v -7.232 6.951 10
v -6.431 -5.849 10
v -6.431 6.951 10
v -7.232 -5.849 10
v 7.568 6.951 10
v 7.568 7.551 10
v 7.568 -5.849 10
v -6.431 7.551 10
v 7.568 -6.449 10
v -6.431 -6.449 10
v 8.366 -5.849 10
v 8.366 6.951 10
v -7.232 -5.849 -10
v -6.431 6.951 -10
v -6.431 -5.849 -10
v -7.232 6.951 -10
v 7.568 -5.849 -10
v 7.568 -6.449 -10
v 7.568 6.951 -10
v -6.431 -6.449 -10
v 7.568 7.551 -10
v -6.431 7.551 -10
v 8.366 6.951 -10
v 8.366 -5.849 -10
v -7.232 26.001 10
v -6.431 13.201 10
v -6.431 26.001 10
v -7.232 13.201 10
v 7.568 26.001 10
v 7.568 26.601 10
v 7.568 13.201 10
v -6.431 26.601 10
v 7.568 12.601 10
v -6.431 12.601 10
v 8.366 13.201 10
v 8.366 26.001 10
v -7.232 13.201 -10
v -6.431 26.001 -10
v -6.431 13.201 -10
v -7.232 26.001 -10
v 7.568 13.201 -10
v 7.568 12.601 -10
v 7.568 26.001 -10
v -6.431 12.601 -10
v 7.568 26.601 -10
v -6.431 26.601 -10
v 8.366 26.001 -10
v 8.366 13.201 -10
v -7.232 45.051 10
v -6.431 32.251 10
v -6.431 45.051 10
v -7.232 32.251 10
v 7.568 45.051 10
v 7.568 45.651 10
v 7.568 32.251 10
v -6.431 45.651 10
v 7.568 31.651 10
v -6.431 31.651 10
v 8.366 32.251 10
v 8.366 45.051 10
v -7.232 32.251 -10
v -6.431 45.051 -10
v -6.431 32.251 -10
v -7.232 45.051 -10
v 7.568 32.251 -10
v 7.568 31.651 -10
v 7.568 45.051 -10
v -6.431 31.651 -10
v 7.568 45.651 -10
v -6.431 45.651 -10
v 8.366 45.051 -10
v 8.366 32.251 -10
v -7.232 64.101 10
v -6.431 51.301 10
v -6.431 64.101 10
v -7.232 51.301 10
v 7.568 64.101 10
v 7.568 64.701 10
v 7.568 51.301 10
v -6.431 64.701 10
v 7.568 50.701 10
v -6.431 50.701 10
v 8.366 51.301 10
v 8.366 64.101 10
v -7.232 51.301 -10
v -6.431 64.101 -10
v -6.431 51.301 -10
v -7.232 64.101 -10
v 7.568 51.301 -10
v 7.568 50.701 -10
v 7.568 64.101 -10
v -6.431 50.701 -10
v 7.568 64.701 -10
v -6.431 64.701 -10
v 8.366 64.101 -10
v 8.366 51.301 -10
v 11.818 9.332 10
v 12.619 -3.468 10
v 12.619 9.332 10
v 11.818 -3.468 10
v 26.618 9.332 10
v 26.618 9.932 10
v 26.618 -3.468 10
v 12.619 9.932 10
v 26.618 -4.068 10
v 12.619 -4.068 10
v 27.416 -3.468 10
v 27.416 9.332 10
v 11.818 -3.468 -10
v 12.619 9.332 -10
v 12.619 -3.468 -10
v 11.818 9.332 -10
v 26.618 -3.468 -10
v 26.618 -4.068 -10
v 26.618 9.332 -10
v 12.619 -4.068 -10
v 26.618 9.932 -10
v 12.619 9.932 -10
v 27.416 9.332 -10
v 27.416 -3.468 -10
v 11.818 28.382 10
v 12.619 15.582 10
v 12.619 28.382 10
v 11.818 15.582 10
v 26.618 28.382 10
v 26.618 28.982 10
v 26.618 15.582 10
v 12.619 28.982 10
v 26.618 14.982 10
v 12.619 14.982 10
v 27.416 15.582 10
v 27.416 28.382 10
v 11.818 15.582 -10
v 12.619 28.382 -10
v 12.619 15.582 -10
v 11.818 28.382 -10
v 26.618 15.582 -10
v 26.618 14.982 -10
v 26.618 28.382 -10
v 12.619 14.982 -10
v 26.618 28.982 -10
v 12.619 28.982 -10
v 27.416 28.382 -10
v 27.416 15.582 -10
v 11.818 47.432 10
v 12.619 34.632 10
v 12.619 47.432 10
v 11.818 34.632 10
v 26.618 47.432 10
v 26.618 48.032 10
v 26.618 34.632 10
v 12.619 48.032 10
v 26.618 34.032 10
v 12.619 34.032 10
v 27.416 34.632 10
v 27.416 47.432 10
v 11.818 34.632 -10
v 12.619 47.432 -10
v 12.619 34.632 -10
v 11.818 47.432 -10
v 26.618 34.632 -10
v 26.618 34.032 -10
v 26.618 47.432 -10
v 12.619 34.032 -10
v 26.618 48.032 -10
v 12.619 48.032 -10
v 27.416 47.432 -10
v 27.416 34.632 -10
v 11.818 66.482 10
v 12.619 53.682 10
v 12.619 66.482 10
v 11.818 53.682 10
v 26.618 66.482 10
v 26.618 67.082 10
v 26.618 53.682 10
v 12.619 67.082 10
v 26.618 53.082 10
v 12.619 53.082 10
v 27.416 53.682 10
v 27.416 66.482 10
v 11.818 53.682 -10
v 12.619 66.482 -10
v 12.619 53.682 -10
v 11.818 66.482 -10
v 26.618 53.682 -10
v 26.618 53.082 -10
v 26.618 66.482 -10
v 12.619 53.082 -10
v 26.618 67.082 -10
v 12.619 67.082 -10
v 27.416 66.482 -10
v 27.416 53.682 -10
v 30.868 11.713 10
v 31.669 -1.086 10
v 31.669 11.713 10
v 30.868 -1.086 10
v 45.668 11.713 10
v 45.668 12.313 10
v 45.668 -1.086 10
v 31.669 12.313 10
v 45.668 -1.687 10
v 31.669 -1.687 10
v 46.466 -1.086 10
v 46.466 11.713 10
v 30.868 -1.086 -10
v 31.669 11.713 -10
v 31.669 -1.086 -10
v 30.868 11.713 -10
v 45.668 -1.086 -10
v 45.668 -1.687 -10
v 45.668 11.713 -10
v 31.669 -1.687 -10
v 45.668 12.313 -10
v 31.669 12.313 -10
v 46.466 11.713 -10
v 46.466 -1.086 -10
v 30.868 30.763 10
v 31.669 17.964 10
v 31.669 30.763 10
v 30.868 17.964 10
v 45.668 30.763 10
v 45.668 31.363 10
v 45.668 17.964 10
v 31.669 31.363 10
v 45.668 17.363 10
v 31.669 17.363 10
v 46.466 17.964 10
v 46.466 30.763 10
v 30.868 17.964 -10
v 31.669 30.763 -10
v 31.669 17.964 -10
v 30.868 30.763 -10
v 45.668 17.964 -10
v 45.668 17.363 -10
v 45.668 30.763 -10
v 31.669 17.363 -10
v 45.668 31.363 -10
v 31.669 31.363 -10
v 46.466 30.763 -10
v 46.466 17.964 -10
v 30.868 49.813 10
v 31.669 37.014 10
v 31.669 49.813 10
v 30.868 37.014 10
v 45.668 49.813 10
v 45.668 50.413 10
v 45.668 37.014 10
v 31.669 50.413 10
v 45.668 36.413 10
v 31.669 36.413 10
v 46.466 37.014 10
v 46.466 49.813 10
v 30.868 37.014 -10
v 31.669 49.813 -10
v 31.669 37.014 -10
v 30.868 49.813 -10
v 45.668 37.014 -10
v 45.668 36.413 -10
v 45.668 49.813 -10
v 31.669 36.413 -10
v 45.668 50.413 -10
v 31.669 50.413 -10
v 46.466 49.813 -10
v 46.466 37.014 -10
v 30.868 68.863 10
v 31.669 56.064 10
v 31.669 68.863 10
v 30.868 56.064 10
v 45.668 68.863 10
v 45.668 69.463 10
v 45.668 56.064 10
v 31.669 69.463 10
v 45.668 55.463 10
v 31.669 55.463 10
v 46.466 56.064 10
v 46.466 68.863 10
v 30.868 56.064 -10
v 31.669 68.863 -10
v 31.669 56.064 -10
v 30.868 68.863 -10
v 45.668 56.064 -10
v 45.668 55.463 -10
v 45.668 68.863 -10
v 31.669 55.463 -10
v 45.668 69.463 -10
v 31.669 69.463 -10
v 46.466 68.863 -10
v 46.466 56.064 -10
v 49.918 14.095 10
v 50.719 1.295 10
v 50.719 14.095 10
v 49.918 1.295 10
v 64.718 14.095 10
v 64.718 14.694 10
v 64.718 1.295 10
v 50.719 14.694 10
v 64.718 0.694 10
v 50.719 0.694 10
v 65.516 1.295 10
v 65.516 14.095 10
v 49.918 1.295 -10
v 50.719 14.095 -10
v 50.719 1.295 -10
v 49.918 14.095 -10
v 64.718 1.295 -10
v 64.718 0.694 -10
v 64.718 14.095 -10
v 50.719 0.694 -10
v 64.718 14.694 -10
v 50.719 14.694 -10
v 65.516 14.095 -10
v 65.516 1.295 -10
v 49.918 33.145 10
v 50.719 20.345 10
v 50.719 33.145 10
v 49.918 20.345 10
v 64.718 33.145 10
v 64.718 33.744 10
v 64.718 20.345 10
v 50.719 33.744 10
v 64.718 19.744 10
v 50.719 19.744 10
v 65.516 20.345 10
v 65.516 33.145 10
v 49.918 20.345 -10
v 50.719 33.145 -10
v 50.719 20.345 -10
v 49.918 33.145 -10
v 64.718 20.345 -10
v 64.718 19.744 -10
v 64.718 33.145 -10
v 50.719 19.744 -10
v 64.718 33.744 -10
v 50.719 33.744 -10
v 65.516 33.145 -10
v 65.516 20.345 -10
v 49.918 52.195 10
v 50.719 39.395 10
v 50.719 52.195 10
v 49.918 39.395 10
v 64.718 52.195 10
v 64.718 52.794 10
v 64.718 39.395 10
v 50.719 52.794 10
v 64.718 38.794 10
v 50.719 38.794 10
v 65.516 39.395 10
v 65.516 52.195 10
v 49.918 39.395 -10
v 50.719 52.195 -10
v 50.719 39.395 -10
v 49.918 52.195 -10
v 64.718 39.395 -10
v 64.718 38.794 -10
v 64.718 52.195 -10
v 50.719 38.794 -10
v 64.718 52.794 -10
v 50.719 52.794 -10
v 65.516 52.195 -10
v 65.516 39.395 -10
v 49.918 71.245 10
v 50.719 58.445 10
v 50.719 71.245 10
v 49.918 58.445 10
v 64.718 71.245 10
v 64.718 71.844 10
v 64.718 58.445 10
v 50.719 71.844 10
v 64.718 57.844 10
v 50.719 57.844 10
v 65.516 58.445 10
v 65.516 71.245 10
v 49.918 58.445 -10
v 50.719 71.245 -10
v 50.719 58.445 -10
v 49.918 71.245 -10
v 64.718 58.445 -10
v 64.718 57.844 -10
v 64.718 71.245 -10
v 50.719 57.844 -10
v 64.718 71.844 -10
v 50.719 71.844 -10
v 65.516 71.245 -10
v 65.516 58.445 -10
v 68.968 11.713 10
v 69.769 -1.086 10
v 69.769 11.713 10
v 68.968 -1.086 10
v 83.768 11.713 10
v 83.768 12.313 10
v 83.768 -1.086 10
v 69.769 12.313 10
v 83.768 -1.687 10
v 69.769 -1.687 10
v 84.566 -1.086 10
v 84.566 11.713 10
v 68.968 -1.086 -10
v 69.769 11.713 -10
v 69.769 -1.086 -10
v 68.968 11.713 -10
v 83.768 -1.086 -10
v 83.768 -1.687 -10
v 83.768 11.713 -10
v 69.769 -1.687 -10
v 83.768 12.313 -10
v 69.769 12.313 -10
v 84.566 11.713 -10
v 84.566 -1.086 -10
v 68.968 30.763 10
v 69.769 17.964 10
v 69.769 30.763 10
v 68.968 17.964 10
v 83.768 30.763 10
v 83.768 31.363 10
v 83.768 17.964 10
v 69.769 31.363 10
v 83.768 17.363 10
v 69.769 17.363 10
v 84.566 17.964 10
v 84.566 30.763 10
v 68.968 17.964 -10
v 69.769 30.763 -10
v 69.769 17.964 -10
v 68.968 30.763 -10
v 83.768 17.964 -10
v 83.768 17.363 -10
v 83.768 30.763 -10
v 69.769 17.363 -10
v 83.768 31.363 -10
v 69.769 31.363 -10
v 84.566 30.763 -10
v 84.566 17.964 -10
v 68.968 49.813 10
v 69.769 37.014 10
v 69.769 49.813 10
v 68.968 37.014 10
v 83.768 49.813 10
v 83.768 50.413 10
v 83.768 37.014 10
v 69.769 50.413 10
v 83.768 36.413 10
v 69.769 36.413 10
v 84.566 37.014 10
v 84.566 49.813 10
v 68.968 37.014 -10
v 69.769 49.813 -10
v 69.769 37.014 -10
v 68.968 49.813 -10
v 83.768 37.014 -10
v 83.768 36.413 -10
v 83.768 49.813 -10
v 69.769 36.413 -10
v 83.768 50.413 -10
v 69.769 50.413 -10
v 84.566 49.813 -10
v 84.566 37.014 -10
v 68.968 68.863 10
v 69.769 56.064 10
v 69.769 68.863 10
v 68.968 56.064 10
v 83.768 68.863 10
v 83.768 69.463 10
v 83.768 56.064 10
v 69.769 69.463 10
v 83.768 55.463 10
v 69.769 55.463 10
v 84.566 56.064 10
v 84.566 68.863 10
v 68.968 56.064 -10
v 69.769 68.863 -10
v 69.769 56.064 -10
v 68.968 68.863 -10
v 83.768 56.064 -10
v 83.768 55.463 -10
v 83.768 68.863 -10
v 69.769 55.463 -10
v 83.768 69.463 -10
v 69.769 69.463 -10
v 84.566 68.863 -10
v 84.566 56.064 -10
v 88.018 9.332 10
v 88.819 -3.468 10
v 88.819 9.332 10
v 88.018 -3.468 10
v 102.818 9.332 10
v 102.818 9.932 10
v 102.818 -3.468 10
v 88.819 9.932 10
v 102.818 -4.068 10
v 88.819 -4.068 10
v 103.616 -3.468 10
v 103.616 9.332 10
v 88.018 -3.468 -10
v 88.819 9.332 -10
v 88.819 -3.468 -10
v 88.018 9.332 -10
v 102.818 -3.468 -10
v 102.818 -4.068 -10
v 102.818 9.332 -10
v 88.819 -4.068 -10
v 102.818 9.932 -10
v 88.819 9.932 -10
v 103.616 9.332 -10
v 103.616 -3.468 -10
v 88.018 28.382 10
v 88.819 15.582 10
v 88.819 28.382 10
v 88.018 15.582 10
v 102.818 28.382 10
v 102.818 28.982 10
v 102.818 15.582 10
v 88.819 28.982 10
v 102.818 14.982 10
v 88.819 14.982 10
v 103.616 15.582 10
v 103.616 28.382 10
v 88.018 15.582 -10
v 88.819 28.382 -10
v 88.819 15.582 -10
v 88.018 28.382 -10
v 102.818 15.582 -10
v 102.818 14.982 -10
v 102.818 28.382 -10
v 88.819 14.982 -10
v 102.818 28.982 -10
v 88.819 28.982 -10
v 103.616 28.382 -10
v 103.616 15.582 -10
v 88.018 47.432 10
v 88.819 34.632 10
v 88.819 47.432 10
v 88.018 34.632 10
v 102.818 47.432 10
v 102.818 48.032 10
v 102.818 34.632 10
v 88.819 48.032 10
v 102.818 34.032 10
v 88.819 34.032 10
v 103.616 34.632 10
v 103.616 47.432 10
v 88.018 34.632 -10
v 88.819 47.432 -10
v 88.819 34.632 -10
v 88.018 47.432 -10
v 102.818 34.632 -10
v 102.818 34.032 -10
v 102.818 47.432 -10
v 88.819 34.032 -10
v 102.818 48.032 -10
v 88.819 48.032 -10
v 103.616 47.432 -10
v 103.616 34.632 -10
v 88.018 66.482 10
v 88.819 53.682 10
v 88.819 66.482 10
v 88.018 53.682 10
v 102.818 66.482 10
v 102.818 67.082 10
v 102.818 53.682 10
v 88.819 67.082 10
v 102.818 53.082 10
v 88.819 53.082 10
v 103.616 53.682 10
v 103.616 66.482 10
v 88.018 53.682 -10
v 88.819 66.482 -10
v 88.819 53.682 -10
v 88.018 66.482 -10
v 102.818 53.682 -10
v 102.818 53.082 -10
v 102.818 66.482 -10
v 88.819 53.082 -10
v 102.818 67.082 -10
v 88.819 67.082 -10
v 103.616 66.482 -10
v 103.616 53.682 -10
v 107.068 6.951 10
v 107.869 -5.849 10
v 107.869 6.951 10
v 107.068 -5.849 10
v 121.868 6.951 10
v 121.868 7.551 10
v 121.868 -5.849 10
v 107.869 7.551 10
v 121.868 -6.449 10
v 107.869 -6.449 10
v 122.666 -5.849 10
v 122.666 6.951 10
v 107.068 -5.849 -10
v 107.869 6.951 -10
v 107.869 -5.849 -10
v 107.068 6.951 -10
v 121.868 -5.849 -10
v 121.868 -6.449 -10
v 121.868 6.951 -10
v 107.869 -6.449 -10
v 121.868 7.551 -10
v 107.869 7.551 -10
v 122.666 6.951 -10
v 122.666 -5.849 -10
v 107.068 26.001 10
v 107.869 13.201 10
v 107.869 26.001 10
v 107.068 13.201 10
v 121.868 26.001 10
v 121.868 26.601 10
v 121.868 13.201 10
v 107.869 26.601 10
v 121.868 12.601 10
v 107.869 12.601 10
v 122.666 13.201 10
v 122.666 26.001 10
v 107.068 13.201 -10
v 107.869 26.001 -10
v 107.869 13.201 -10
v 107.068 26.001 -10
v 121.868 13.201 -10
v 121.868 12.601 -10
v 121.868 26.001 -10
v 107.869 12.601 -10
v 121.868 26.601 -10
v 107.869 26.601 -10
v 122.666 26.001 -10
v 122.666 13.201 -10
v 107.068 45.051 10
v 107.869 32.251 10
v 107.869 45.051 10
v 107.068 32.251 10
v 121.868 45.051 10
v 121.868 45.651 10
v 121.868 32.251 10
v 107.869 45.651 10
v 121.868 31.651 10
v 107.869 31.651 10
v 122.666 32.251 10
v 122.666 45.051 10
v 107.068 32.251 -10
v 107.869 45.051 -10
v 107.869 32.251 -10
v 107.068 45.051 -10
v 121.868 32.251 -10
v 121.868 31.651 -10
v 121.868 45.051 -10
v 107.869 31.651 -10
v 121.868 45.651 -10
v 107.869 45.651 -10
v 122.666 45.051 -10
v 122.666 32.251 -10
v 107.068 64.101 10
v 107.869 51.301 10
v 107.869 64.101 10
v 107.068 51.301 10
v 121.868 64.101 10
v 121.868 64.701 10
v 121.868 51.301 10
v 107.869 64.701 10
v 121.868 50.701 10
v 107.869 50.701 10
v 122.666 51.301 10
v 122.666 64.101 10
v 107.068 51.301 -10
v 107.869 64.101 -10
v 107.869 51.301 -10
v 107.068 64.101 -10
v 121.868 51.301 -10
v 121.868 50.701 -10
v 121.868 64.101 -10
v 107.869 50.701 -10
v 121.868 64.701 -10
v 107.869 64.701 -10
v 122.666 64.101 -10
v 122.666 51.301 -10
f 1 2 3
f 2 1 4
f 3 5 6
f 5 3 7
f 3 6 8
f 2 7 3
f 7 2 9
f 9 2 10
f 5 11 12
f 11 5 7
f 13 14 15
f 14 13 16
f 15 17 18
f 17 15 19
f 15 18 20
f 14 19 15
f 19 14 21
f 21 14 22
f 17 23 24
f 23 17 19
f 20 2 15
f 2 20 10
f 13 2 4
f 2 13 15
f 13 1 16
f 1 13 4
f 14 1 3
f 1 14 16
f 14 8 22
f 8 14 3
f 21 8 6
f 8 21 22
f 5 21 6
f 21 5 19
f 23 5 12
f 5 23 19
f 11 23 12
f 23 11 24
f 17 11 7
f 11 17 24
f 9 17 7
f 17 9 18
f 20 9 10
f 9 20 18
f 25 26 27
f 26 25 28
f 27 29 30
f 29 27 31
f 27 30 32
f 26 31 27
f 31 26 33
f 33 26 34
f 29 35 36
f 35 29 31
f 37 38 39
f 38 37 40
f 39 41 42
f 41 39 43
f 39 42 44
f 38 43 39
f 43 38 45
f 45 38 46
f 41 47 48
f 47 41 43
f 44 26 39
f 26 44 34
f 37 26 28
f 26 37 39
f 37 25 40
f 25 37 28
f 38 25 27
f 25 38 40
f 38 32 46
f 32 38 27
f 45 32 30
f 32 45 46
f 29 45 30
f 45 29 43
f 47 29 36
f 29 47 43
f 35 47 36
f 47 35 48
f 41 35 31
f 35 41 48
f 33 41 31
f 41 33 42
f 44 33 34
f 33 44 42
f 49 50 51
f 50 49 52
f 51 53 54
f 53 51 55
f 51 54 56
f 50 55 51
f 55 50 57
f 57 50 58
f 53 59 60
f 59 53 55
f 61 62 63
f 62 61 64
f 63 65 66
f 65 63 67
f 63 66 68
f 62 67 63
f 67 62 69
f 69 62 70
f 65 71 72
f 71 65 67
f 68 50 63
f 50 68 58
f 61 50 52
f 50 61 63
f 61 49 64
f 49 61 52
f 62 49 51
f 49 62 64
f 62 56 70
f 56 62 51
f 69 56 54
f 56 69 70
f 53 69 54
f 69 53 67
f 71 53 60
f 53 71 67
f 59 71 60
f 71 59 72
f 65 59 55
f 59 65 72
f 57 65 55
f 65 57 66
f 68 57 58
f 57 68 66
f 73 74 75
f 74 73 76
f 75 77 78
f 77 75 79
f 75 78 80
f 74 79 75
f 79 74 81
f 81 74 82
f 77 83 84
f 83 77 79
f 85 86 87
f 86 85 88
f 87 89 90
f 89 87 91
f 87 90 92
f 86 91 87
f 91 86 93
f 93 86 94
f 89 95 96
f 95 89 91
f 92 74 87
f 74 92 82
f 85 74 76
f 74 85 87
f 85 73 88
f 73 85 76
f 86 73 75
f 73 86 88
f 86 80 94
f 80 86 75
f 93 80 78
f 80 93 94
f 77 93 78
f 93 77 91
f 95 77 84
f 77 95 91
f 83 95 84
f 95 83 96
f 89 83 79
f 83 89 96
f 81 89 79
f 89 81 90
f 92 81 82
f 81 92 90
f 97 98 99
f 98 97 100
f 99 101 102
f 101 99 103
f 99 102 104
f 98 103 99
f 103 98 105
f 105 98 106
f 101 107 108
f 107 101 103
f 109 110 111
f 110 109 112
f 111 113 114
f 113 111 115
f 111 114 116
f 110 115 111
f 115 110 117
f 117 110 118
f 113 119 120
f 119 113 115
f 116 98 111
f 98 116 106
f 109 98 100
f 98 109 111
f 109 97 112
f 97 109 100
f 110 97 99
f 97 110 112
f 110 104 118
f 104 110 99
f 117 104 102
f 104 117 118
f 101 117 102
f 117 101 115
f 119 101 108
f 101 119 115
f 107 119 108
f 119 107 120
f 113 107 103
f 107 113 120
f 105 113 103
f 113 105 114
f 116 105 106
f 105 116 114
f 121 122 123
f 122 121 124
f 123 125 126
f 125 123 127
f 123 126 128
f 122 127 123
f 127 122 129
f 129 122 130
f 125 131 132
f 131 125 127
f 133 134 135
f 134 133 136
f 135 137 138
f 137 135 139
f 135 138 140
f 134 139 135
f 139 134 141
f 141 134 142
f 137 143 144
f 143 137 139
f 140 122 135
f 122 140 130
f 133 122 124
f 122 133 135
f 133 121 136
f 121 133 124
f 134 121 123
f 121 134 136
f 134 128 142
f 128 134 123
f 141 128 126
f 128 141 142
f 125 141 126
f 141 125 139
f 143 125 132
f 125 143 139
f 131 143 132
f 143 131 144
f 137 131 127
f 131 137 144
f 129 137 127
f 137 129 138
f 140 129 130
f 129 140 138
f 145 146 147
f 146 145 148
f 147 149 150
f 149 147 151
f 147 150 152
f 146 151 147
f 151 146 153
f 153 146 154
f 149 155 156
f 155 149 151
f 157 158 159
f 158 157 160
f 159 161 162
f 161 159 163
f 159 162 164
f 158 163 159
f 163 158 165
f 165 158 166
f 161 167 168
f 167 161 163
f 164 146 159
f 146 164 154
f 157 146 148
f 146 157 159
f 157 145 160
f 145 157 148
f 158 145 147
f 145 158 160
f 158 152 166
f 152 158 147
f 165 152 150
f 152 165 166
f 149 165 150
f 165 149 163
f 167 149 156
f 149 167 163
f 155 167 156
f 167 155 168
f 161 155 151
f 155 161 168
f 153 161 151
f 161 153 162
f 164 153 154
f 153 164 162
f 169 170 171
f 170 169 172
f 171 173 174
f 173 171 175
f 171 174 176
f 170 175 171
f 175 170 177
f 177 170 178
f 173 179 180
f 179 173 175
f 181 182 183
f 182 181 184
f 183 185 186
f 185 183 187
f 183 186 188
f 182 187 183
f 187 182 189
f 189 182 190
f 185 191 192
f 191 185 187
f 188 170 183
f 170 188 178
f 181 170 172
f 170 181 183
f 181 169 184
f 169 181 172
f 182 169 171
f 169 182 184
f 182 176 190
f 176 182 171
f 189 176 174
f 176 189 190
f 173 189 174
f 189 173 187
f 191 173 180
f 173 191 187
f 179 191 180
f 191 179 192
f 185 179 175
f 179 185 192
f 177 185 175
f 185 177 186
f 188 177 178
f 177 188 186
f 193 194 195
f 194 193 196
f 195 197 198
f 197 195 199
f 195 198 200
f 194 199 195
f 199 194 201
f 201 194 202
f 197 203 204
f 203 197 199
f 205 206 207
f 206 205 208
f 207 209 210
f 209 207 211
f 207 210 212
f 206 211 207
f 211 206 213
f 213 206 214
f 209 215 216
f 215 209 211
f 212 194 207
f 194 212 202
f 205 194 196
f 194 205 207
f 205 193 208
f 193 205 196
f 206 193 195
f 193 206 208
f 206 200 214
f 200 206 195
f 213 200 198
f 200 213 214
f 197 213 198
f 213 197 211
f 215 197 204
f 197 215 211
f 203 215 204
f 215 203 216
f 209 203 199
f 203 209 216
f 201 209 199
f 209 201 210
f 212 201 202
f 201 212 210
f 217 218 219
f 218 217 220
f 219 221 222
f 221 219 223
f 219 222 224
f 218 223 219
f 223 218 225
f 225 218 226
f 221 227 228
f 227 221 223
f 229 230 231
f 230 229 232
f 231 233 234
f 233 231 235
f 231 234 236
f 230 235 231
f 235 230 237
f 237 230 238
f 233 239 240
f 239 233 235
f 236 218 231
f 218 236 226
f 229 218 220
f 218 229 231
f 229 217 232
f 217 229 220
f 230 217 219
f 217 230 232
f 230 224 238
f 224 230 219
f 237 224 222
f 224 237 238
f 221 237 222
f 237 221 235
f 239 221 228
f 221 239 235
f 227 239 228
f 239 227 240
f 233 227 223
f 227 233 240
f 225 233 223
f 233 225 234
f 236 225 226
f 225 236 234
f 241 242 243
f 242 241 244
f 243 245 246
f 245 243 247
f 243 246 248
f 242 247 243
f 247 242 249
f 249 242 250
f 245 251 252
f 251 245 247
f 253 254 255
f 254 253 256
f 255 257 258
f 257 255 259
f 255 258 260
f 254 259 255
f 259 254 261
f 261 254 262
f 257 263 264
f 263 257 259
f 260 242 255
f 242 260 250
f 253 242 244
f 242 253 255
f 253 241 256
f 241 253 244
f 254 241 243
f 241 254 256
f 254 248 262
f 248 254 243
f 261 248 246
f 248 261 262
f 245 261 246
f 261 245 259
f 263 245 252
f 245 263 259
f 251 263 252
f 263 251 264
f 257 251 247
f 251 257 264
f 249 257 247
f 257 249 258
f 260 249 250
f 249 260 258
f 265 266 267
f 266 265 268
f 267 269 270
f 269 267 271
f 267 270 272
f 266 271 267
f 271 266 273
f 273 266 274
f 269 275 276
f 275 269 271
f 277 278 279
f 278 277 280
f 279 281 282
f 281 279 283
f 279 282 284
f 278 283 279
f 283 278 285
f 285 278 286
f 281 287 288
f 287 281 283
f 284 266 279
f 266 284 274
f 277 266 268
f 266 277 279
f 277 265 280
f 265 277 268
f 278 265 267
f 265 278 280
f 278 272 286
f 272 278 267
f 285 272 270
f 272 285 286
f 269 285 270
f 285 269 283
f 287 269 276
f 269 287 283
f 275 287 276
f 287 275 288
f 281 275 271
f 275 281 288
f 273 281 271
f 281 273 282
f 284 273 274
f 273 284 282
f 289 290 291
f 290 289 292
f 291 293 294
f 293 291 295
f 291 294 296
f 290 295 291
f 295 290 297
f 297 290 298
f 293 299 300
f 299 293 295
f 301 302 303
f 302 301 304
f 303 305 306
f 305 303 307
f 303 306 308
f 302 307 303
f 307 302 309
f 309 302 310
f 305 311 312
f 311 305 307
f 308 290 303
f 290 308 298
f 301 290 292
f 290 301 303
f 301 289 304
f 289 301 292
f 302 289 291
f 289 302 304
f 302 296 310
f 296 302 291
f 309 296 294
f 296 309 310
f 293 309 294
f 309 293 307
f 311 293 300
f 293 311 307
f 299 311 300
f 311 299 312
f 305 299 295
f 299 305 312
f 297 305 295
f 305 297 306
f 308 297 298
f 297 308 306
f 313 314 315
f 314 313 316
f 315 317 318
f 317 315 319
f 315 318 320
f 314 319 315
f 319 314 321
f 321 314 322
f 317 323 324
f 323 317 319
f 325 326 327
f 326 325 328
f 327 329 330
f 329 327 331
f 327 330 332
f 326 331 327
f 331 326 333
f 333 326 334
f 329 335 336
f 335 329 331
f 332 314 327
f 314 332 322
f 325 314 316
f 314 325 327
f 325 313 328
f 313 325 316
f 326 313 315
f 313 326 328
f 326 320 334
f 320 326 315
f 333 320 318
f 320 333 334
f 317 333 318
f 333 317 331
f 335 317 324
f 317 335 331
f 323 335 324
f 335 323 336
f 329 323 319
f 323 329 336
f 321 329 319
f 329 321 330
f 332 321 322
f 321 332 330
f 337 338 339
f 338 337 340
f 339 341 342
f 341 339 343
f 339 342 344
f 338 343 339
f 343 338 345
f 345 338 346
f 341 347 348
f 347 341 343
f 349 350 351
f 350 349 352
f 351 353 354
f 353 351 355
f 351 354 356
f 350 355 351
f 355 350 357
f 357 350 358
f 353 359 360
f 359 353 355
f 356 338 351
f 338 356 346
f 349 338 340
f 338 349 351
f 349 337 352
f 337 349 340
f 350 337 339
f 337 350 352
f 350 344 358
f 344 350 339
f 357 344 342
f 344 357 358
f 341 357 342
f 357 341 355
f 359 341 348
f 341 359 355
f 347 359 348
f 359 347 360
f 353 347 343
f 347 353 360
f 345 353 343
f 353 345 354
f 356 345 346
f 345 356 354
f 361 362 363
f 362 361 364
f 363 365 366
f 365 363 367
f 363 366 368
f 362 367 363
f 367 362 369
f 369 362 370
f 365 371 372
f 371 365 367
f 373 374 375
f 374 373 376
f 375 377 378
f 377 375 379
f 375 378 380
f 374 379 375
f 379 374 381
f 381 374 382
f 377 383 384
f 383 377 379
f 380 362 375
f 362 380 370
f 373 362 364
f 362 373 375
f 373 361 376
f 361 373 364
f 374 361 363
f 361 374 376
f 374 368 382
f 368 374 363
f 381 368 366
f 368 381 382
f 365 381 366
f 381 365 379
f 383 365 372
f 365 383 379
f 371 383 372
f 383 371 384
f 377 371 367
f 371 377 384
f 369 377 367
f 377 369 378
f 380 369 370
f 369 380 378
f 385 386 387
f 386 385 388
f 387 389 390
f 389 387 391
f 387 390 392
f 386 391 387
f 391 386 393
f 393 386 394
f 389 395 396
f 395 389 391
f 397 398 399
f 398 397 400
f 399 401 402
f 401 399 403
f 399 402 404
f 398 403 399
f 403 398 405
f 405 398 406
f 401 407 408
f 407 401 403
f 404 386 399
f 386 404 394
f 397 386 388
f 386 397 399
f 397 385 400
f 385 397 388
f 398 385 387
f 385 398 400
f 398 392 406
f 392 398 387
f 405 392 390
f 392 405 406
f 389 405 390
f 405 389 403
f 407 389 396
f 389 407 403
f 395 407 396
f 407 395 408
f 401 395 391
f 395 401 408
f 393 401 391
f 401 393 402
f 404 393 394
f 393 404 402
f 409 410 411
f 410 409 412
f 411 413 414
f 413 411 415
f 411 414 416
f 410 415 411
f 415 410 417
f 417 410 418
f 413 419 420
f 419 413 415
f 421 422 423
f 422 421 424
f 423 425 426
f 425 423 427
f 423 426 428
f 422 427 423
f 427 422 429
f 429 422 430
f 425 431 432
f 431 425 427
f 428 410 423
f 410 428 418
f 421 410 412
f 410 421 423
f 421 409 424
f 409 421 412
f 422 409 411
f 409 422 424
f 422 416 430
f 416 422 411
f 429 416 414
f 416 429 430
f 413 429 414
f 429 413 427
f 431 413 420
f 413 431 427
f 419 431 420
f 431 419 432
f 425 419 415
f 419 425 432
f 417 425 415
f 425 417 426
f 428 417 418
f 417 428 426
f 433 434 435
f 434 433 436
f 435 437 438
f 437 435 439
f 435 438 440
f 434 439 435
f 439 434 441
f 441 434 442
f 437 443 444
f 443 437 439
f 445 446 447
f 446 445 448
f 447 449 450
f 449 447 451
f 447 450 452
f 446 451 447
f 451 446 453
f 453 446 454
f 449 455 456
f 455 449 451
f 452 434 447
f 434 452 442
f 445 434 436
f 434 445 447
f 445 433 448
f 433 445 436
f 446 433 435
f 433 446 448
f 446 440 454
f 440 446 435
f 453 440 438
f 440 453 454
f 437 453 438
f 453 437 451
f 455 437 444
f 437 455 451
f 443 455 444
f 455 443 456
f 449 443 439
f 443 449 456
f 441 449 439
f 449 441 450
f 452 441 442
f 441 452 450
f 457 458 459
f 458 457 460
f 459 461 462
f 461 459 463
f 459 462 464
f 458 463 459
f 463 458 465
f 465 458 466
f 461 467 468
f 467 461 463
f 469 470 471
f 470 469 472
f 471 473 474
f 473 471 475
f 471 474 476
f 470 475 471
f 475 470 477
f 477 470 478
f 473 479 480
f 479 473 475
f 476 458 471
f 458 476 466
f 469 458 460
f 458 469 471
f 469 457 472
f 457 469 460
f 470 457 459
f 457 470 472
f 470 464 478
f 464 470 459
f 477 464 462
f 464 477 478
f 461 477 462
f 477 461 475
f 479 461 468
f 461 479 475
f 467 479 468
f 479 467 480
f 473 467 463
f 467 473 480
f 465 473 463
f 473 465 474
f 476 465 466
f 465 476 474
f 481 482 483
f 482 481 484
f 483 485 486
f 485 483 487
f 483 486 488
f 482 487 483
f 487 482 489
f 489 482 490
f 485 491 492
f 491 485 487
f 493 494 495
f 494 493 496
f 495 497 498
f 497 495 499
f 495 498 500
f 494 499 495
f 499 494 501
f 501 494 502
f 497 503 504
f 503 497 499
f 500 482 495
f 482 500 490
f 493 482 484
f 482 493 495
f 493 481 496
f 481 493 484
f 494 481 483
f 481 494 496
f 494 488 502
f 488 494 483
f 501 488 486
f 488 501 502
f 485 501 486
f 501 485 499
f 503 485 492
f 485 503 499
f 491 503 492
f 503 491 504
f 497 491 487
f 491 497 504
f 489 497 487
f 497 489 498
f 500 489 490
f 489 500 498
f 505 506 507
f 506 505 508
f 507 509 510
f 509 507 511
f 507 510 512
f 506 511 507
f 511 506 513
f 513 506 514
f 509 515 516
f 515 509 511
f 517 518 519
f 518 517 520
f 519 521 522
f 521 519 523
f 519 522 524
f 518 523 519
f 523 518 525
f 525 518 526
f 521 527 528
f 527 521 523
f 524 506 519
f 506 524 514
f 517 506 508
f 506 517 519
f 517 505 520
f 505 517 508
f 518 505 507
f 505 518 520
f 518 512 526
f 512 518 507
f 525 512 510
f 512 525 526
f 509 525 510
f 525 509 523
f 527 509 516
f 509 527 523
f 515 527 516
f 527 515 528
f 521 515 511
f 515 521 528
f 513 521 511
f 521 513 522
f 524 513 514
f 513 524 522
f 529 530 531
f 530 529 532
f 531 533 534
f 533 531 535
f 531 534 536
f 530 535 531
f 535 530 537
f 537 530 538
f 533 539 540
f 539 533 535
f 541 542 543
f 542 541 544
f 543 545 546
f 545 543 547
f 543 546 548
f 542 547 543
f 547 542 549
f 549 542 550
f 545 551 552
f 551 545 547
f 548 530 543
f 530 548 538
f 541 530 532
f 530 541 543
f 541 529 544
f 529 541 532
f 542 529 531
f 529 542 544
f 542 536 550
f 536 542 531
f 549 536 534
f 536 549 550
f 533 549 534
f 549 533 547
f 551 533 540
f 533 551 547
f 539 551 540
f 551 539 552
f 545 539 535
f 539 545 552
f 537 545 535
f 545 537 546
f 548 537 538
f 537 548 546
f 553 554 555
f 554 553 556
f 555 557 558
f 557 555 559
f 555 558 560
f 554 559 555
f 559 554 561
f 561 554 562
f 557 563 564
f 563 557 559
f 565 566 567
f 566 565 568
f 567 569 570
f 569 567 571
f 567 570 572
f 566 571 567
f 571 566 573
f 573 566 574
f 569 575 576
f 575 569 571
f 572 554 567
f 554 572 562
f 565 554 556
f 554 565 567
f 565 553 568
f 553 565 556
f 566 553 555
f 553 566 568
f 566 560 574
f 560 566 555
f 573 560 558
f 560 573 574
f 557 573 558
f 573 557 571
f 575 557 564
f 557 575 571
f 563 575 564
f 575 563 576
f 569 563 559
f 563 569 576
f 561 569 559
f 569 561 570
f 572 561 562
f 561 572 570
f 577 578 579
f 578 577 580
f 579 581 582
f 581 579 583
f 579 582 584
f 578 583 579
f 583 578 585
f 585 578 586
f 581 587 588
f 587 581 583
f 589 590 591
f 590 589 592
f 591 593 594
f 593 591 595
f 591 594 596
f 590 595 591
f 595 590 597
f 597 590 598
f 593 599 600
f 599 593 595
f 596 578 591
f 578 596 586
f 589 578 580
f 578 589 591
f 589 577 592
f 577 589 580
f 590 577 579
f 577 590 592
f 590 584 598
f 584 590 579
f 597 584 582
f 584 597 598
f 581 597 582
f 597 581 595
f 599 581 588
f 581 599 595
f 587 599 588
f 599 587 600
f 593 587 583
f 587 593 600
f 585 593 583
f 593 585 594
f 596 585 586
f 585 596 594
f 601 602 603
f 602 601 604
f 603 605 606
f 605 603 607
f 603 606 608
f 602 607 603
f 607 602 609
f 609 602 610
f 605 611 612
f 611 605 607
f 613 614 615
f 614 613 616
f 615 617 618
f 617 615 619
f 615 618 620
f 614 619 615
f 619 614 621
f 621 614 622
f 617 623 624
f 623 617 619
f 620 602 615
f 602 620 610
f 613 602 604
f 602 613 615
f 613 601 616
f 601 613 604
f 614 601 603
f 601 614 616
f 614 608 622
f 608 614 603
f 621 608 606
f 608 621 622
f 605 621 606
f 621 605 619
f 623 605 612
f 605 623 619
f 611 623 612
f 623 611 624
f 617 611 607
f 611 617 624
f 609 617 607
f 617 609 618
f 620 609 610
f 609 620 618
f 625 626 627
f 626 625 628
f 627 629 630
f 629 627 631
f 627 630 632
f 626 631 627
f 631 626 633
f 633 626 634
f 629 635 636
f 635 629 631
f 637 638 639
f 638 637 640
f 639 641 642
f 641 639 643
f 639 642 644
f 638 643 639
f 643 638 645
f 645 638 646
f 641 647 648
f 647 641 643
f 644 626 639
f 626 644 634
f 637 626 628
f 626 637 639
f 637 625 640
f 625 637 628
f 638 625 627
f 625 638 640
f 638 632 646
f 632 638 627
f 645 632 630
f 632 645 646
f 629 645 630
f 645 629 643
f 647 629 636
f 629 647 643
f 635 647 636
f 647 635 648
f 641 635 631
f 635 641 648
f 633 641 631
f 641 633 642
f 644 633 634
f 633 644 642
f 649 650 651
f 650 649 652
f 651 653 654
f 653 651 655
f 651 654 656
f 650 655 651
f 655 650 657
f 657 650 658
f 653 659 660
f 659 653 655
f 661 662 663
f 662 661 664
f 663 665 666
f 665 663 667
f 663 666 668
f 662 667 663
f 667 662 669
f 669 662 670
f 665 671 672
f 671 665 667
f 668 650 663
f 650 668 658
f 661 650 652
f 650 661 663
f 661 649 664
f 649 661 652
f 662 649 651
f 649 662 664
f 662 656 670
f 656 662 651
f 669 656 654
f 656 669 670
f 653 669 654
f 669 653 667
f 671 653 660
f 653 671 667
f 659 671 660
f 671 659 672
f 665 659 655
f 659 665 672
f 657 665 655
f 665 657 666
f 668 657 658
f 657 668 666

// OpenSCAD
spacingdfx=25.4*3/4;

spacing=25.4*3/4;

frontbackangle = 10;
leftrightangle = 10;
mxalps = 1;  // 0:MX 1:MXAlps

module punchMX()
{
 difference(){
  cube([20,20,20],center = true);
        
        translate([-spacingdfx,-spacingdfx,0])
        linear_extrude(height = 50, center = true, convexity = 10)
        import (file = "MX2.dxf");



 }
}

module punchMXAlps()
{
 difference(){
  cube([20,20,20],center = true);
        
        translate([-spacingdfx,-spacingdfx,0])
        linear_extrude(height = 50, center = true, convexity = 10)
        import (file = "MXAlps2.dxf");



 }
}   

translate([0*spacing,0*spacing,0])
        union()
        {

        translate ([0*spacing,0*spacing,0]) if (mxalps==1) punchMXAlps(); else punchMX(); 
        translate ([0*spacing,1*spacing,0]) if (mxalps==1) punchMXAlps(); else punchMX(); 
    translate ([0*spacing,2*spacing,0]) if (mxalps==1) punchMXAlps(); else punchMX(); 
        translate ([0*spacing,3*spacing,0]) if (mxalps==1) punchMXAlps(); else punchMX(); 
}

translate([1*spacing,0.125*spacing,0])
        union()
        {
translate ([0*spacing,0*spacing,0]) if (mxalps==1) punchMXAlps(); else punchMX(); 
translate ([0*spacing,1*spacing,0]) if (mxalps==1) punchMXAlps(); else punchMX(); 
    translate ([0*spacing,2*spacing,0]) if (mxalps==1) punchMXAlps(); else punchMX(); 
        translate ([0*spacing,3*spacing,0]) if (mxalps==1) punchMXAlps(); else punchMX(); }
        
translate([2*spacing,0.25*spacing,0])
        union()
        {
translate ([0*spacing,0*spacing,0]) if (mxalps==1) punchMXAlps(); else punchMX(); 
translate ([0*spacing,1*spacing,0]) if (mxalps==1) punchMXAlps(); else punchMX(); 
    translate ([0*spacing,2*spacing,0]) if (mxalps==1) punchMXAlps(); else punchMX(); 
        translate ([0*spacing,3*spacing,0]) if (mxalps==1) punchMXAlps(); else punchMX(); }        

translate([3*spacing,0.375*spacing,0])
        union()
        {
translate ([0*spacing,0*spacing,0]) if (mxalps==1) punchMXAlps(); else punchMX(); 
translate ([0*spacing,1*spacing,0]) if (mxalps==1) punchMXAlps(); else punchMX(); 
    translate ([0*spacing,2*spacing,0]) if (mxalps==1) punchMXAlps(); else punchMX(); 
        translate ([0*spacing,3*spacing,0]) if (mxalps==1) punchMXAlps(); else punchMX(); }
        
translate([4*spacing,0.25*spacing,0])
        union()
        {
translate ([0*spacing,0*spacing,0]) if (mxalps==1) punchMXAlps(); else punchMX(); 
translate ([0*spacing,1*spacing,0]) if (mxalps==1) punchMXAlps(); else punchMX(); 
    translate ([0*spacing,2*spacing,0]) if (mxalps==1) punchMXAlps(); else punchMX(); 
        translate ([0*spacing,3*spacing,0]) if (mxalps==1) punchMXAlps(); else punchMX(); }   
        
translate([5*spacing,0.125*spacing,0])
        union()
        {
translate ([0*spacing,0*spacing,0]) if (mxalps==1) punchMXAlps(); else punchMX(); 
translate ([0*spacing,1*spacing,0]) if (mxalps==1) punchMXAlps(); else punchMX(); 
    translate ([0*spacing,2*spacing,0]) if (mxalps==1) punchMXAlps(); else punchMX(); 
        translate ([0*spacing,3*spacing,0]) if (mxalps==1) punchMXAlps(); else punchMX(); }                        
        translate([6*spacing,0*spacing,0])
        union()
        {
translate ([0*spacing,0*spacing,0]) if (mxalps==1) punchMXAlps(); else punchMX(); 
translate ([0*spacing,1*spacing,0]) if (mxalps==1) punchMXAlps(); else punchMX(); 
    translate ([0*spacing,2*spacing,0]) if (mxalps==1) punchMXAlps(); else punchMX(); 
        translate ([0*spacing,3*spacing,0]) if (mxalps==1) punchMXAlps(); else punchMX(); }                        
